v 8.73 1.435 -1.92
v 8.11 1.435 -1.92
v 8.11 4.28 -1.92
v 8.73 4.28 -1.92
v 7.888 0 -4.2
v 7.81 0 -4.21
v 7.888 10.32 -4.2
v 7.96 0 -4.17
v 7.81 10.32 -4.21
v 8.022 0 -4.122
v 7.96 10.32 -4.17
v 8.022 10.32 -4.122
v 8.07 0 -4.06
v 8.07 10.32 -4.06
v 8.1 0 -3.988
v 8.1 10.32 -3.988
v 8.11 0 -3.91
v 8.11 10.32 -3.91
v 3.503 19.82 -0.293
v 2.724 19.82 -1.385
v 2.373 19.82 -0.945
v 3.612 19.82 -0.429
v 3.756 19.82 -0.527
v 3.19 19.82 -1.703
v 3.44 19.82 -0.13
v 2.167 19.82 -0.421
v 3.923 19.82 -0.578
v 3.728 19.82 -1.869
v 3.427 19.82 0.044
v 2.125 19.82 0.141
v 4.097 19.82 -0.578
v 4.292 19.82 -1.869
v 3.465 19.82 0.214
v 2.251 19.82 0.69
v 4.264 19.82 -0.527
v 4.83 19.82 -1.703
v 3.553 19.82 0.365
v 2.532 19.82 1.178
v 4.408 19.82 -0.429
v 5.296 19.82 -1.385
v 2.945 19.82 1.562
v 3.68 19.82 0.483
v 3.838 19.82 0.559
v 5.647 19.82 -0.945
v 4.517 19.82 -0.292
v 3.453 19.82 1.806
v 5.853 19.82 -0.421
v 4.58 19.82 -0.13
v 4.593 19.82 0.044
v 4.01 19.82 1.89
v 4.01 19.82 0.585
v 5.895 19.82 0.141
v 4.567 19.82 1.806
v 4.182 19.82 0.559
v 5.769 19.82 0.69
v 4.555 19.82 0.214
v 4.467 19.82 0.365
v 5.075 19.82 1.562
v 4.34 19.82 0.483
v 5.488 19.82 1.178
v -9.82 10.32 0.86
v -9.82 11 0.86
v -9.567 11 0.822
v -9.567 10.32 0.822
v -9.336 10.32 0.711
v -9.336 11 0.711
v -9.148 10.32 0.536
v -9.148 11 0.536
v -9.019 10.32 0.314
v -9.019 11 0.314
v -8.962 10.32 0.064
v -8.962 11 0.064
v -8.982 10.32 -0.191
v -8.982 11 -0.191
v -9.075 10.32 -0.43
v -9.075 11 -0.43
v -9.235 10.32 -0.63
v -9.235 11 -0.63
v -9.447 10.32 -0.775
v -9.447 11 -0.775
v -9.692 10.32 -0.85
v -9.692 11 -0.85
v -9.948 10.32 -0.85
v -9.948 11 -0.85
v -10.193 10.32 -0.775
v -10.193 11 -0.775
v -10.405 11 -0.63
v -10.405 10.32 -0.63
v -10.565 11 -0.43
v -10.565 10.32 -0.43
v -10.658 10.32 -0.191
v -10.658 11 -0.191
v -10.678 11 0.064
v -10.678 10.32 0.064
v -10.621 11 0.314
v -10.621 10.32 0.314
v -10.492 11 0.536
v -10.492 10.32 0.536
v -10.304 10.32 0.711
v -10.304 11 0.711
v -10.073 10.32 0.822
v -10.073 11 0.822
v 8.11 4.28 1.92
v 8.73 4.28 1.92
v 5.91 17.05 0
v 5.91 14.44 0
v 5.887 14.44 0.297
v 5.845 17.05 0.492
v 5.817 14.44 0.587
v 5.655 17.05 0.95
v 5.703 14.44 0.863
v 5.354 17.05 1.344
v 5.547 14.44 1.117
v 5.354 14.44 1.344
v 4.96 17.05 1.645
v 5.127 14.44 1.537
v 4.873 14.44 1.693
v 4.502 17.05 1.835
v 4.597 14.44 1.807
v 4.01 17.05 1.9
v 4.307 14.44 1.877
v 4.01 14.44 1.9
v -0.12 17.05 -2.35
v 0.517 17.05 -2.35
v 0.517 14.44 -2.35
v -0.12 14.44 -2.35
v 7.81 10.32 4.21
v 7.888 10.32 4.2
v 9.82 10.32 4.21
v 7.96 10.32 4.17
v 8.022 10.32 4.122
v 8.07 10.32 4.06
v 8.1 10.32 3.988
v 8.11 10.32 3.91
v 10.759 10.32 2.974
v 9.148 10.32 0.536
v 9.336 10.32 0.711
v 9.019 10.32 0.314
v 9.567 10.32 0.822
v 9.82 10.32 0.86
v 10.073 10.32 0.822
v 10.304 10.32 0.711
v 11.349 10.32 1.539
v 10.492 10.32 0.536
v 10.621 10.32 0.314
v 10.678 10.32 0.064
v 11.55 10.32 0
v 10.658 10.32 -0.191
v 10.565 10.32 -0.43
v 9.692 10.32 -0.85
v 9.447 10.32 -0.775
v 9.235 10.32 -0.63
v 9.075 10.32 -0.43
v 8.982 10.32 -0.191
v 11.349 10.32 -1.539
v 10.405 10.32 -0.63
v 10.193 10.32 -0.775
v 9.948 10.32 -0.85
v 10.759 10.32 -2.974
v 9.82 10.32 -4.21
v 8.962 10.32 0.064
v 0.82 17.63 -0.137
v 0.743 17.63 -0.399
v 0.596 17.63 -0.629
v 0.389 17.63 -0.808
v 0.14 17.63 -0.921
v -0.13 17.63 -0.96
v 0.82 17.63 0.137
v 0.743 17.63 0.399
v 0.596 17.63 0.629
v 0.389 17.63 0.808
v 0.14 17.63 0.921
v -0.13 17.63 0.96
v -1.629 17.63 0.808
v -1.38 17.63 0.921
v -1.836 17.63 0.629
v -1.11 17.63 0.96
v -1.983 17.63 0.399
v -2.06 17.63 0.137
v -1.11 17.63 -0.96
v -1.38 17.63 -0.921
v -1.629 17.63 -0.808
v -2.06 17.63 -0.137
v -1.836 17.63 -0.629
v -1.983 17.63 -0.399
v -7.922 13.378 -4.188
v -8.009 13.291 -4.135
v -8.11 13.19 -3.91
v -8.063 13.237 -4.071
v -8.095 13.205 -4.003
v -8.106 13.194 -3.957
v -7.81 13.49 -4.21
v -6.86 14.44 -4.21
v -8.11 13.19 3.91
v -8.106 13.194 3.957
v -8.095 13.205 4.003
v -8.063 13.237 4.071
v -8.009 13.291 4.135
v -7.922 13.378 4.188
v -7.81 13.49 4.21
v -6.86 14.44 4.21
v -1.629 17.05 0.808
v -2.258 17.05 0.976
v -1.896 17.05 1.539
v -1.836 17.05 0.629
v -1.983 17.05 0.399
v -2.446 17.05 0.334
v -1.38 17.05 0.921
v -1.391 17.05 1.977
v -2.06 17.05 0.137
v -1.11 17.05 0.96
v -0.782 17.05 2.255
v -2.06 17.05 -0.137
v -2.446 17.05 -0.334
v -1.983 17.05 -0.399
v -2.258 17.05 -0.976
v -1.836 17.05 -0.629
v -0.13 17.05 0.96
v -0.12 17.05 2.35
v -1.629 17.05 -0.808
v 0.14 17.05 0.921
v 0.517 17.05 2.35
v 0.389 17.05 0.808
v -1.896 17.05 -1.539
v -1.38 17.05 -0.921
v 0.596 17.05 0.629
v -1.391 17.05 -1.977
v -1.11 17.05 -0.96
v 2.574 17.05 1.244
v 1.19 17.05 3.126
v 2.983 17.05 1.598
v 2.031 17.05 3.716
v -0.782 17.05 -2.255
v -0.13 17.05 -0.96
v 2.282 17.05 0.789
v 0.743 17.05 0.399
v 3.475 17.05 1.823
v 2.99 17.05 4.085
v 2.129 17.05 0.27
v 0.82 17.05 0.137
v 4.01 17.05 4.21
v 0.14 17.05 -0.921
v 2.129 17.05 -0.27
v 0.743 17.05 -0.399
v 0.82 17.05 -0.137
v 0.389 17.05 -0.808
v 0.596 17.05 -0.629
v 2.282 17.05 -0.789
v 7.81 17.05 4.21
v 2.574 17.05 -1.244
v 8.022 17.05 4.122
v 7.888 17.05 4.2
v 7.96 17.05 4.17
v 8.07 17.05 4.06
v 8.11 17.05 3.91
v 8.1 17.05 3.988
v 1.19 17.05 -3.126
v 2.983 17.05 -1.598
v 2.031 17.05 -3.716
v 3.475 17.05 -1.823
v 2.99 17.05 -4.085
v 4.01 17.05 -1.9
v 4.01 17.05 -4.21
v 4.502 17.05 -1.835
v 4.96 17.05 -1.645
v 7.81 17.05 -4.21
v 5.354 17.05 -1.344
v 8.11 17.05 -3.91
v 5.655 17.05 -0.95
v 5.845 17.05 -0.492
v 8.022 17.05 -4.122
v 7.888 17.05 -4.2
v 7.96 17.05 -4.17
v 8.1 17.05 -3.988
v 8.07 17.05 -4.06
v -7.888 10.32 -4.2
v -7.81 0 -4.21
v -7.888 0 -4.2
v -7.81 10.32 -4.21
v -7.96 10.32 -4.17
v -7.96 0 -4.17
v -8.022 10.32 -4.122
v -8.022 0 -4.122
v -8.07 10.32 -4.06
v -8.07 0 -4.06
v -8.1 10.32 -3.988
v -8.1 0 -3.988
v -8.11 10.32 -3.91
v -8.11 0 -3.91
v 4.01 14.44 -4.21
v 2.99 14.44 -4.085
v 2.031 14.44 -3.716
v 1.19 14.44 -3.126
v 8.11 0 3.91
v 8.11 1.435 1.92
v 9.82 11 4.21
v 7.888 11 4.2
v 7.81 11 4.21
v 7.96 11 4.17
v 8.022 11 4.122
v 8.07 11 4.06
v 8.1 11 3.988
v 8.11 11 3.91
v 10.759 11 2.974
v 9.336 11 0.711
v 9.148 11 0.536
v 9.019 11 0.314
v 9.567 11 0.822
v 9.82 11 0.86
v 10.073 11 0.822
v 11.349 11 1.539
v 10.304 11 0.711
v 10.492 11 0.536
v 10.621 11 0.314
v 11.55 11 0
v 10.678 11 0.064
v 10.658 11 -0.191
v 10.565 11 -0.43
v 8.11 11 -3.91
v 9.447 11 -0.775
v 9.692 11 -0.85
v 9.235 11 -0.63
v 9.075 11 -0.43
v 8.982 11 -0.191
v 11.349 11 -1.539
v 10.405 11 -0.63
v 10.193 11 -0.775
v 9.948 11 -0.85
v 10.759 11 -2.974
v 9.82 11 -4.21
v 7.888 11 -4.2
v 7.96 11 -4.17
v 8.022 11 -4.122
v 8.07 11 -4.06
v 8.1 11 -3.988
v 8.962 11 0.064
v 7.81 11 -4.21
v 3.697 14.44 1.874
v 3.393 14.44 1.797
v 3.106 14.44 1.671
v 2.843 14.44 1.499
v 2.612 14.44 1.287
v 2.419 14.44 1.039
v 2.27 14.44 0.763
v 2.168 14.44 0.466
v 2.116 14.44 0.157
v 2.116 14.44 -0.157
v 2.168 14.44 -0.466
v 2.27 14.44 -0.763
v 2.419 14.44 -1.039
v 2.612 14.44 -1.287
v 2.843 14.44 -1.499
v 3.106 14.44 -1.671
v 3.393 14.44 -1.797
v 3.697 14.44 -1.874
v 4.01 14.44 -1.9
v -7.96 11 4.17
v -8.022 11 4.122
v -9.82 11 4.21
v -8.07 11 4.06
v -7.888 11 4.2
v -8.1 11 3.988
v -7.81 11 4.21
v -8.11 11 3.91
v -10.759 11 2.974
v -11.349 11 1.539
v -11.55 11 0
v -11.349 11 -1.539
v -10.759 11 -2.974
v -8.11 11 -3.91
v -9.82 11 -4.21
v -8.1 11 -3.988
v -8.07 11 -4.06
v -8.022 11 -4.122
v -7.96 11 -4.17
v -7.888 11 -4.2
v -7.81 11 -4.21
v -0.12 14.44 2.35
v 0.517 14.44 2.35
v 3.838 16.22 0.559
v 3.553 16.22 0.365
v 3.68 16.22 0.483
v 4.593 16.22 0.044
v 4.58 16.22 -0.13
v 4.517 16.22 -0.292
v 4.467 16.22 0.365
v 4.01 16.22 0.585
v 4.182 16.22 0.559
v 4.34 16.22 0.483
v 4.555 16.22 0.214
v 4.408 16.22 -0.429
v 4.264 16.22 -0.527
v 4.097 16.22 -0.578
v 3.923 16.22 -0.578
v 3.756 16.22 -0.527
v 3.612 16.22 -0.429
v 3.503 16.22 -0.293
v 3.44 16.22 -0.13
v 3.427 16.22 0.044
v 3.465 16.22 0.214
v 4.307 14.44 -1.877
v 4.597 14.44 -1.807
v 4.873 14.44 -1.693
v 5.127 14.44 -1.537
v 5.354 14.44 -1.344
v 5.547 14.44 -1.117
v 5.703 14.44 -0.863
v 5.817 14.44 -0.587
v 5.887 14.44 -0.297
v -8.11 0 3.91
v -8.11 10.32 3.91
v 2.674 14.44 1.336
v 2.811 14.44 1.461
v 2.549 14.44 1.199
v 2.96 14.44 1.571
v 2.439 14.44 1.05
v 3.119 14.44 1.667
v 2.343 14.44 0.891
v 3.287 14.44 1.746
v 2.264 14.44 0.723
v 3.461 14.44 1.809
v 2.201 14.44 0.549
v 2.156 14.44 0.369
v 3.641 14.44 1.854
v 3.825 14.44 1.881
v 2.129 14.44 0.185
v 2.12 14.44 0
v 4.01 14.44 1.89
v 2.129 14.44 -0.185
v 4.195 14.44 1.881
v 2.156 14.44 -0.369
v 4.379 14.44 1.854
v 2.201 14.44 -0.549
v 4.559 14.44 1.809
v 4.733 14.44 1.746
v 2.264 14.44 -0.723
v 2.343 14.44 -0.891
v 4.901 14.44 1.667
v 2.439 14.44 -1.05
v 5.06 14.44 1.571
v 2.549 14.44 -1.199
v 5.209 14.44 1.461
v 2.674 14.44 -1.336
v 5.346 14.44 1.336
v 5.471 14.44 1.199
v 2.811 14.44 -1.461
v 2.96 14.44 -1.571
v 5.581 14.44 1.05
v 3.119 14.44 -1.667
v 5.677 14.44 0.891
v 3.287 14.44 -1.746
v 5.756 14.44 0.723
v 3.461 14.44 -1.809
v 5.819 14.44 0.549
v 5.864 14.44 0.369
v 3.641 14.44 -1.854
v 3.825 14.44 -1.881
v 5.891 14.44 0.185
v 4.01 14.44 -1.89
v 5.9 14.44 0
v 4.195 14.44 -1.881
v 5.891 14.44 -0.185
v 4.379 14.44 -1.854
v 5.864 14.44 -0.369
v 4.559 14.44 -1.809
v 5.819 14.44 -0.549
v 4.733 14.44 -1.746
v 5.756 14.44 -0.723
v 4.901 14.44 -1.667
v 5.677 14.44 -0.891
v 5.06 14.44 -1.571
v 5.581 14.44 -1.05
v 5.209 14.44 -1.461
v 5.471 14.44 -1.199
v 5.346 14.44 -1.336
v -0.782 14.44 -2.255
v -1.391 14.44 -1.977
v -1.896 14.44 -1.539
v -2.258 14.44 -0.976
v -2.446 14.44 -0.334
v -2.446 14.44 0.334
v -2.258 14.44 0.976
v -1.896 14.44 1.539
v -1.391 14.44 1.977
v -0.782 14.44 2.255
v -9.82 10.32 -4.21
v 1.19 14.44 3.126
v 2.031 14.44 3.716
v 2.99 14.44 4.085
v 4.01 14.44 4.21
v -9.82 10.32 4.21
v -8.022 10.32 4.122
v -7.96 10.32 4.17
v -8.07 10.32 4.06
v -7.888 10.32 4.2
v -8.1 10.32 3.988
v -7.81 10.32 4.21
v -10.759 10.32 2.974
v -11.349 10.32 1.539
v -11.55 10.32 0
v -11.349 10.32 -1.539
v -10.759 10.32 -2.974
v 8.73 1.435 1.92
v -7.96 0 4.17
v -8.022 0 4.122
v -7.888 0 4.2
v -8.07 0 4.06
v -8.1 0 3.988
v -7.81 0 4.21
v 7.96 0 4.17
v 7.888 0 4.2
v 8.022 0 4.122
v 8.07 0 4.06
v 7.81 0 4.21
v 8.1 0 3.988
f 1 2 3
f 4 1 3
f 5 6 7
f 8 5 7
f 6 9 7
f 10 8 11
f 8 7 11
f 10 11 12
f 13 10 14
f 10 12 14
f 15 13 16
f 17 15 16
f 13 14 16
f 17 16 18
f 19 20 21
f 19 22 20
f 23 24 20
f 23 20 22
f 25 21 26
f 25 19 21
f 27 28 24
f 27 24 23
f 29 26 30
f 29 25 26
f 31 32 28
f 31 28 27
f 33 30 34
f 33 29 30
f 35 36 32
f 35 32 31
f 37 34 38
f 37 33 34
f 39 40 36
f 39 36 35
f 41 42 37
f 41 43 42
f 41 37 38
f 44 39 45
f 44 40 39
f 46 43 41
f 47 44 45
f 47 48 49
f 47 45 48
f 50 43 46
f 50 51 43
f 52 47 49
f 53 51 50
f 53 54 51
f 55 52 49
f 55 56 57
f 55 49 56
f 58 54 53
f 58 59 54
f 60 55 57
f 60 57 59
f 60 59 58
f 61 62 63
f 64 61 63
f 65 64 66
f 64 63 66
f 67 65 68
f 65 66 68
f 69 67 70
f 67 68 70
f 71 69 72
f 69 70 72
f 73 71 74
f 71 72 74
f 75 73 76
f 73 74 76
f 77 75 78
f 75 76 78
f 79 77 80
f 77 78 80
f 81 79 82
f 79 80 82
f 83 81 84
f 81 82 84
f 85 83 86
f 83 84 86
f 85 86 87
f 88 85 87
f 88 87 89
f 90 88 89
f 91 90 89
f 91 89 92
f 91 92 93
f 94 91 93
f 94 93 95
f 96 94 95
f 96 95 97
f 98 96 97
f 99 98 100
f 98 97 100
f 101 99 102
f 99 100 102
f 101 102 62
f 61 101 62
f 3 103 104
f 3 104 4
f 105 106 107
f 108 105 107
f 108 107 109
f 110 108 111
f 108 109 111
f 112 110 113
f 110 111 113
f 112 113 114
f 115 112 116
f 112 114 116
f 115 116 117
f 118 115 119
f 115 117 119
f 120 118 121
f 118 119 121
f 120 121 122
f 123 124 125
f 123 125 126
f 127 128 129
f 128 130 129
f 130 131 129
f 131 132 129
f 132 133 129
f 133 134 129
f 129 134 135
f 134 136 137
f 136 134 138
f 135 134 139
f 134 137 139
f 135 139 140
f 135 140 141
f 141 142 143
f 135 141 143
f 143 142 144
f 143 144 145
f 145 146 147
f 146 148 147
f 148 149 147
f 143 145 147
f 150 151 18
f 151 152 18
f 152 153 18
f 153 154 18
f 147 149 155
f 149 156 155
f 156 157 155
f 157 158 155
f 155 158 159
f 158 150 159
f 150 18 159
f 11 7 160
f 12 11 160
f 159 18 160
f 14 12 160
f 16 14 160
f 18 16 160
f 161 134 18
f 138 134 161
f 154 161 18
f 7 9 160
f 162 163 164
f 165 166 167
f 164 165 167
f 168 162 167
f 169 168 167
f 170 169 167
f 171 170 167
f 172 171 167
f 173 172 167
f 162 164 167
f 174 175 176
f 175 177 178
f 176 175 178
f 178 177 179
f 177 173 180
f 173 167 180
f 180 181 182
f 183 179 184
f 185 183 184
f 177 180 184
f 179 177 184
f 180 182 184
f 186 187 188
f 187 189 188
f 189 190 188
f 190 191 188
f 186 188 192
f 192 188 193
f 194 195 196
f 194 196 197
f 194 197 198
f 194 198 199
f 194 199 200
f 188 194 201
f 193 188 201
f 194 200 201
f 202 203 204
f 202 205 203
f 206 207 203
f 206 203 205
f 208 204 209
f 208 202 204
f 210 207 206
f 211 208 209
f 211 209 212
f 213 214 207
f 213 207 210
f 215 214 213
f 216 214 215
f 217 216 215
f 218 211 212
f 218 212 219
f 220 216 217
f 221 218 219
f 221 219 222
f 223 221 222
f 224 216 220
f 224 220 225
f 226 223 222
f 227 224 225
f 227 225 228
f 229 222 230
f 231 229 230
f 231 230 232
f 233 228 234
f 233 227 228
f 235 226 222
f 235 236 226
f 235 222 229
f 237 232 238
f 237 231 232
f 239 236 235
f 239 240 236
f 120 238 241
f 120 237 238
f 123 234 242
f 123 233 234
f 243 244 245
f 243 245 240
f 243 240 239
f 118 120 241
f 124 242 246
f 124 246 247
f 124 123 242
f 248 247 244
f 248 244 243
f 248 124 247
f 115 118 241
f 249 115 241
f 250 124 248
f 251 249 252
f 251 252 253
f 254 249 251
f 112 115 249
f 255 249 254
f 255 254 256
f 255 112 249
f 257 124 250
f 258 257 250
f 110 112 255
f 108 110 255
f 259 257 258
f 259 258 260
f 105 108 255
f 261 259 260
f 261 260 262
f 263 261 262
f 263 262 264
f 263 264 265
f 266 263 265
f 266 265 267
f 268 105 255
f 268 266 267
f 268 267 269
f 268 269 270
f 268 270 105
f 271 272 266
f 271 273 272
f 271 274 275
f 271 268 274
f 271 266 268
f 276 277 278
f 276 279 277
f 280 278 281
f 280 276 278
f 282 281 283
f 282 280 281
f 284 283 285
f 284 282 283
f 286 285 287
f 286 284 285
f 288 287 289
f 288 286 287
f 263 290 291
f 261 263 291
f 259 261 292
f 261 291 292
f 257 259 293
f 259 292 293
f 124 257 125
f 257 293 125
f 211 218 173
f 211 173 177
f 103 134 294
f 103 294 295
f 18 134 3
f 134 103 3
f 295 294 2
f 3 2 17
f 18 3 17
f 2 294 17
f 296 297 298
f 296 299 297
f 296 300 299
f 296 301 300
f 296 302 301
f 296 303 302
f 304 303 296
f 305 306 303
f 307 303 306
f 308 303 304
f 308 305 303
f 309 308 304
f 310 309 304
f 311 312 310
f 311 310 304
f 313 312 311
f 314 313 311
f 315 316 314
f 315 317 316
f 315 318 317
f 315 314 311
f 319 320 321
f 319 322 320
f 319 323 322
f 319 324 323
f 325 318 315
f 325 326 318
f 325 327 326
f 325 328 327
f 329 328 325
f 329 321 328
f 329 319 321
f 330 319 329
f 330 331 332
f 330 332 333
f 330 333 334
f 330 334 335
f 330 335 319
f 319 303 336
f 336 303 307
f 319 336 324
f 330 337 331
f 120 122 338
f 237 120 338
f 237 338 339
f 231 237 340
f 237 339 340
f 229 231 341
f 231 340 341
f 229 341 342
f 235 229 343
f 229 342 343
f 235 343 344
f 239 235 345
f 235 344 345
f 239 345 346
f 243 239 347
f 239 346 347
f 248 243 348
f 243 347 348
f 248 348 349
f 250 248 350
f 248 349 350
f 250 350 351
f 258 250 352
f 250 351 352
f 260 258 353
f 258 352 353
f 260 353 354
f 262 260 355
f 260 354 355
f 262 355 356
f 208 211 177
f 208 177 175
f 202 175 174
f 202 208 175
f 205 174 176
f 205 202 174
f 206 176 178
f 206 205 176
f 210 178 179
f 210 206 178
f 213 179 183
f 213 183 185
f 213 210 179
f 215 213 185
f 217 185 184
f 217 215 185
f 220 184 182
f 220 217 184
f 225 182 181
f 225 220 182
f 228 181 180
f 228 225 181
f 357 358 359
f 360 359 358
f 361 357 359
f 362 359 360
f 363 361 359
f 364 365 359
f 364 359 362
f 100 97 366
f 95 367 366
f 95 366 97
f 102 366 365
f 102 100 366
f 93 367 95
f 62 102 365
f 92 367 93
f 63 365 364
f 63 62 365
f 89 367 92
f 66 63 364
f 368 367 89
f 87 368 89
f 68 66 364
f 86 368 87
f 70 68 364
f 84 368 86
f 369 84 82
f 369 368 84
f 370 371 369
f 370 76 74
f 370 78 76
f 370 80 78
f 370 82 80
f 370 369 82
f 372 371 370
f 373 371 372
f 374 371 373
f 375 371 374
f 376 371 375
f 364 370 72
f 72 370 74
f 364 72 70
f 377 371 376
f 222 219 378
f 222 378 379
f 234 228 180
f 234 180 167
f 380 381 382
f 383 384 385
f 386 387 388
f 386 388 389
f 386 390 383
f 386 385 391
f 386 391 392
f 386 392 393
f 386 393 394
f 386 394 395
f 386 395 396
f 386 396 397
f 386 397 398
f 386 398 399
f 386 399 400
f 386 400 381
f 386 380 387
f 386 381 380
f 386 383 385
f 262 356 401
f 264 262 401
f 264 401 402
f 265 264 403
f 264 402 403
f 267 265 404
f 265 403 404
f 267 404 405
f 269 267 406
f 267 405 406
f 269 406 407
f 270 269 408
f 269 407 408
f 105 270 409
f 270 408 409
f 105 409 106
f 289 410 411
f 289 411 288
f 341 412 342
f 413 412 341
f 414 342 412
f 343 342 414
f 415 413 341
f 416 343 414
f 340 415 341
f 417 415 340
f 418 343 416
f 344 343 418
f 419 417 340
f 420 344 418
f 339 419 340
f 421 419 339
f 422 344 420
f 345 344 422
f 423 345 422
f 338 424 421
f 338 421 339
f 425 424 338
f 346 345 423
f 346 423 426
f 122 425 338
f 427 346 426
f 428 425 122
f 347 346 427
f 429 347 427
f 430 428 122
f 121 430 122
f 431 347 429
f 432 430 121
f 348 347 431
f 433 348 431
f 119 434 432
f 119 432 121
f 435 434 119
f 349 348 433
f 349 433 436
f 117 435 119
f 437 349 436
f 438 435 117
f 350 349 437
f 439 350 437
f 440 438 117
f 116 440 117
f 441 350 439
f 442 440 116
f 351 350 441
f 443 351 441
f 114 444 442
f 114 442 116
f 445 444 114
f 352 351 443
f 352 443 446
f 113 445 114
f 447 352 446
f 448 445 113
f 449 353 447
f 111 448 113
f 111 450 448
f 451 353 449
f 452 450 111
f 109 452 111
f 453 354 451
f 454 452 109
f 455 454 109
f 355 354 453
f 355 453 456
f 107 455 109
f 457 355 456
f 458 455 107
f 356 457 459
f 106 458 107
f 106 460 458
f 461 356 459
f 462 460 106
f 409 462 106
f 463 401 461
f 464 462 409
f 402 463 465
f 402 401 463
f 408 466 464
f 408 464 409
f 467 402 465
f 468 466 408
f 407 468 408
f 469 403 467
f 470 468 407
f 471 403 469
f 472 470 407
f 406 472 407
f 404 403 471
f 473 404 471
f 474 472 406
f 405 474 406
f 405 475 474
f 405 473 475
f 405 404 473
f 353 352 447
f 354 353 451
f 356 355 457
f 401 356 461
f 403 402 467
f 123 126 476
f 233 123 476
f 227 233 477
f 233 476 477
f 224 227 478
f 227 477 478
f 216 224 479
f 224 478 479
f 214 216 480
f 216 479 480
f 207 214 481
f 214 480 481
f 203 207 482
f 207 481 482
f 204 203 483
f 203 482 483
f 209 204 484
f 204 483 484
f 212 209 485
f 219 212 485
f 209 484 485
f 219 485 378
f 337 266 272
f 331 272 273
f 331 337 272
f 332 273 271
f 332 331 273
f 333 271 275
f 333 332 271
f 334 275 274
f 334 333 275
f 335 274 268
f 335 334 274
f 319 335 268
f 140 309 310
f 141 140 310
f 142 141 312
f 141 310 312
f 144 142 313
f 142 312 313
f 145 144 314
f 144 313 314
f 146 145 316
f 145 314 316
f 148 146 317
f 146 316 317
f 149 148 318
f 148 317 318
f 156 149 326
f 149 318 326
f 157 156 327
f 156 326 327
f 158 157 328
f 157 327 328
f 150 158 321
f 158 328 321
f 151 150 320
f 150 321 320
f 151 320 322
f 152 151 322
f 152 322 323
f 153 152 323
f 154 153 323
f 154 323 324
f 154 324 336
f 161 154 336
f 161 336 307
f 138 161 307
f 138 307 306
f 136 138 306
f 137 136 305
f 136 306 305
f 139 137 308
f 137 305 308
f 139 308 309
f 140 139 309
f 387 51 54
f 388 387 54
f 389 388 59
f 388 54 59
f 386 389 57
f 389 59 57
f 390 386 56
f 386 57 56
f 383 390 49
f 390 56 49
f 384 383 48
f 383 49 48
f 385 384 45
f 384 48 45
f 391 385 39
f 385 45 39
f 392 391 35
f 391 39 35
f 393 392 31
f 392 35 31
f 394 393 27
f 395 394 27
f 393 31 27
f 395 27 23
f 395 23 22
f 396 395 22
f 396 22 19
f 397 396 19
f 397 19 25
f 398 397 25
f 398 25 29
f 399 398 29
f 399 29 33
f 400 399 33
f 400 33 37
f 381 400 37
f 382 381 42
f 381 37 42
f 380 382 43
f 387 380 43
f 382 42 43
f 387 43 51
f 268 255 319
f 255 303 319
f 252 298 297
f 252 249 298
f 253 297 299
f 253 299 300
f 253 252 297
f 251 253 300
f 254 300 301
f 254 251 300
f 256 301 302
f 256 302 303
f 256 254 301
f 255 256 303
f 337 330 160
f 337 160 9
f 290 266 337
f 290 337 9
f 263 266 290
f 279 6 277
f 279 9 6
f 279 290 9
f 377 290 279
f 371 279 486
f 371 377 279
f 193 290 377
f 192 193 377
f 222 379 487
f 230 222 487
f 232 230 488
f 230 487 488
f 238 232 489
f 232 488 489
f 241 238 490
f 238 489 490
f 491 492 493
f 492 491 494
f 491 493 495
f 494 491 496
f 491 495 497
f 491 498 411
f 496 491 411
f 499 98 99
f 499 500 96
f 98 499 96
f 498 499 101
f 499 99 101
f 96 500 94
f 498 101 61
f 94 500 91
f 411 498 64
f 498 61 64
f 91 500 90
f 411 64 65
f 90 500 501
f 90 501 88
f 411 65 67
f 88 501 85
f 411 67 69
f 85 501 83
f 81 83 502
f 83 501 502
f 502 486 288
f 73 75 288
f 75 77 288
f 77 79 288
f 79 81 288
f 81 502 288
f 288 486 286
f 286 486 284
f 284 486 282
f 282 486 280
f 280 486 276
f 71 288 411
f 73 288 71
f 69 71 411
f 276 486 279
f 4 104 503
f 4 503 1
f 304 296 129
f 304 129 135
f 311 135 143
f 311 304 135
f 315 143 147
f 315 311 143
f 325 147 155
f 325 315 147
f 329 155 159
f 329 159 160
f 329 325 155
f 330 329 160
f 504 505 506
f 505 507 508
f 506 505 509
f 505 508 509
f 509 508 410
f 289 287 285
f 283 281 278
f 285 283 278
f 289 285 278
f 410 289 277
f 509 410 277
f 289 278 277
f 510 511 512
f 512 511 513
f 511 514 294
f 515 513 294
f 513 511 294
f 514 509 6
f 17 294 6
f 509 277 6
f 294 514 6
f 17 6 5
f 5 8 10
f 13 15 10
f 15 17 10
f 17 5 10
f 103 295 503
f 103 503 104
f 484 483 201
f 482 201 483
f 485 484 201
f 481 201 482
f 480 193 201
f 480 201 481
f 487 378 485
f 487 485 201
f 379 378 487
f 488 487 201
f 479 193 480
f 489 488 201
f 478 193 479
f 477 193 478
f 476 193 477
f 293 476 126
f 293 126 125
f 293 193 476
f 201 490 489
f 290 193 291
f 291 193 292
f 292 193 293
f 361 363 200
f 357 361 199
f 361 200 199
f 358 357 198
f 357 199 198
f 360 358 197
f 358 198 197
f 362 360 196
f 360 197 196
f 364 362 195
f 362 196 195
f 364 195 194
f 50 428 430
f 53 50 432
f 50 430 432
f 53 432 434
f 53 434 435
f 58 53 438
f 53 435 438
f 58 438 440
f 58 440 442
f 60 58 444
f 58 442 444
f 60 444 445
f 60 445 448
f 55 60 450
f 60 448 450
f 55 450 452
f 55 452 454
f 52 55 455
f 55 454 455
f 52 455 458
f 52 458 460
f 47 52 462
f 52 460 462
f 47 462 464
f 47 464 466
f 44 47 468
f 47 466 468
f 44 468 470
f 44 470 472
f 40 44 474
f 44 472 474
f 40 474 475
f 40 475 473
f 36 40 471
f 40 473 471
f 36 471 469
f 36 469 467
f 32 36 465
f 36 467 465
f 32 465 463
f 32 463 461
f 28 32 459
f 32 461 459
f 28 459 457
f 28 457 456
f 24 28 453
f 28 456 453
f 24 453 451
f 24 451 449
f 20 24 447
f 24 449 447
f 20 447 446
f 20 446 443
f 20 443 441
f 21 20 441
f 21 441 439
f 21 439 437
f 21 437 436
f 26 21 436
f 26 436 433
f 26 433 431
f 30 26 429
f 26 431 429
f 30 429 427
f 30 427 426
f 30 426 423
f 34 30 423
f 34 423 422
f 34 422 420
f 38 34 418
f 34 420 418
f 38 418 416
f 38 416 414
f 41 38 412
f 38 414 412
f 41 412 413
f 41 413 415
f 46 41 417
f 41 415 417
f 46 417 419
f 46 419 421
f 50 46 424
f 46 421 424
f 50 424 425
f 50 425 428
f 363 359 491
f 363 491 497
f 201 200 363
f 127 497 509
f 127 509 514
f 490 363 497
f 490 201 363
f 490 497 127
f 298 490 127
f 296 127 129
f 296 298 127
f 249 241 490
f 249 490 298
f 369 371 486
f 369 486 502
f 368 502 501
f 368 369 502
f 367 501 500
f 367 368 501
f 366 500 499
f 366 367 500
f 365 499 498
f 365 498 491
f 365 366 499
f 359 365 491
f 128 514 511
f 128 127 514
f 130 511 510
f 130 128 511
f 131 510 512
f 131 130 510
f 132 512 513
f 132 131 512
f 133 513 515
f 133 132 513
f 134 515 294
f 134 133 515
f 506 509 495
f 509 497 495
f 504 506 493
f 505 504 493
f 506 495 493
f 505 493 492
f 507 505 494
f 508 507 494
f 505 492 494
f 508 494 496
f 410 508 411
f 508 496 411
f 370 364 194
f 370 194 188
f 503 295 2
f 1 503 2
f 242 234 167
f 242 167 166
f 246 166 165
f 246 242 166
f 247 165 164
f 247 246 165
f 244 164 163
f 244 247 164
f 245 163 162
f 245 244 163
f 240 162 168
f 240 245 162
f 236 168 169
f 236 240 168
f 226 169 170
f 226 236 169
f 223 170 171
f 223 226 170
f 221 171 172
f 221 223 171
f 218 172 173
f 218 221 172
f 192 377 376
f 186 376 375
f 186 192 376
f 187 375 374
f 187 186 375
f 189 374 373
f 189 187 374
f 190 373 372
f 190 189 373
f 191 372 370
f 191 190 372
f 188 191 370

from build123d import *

# Parameters (mm, degrees)
SKETCH_1_W          = 16.22
SKETCH_1_H          = 8.42
EXTRUDE_1_DEPTH     = 11
SKETCH_2_R          = 0.86
EXTRUDE_2_DEPTH     = 0.68
SKETCH_3_W          = 16.22
SKETCH_3_H          = 8.42
EXTRUDE_3_DEPTH     = 3.44
SKETCH_4_R          = 1.9
EXTRUDE_4_DEPTH     = 2.61
EXTRUDE_5_DEPTH     = 0.58
SKETCH_6_R          = 1.89
EXTRUDE_6_DEPTH     = 5.38
SKETCH_7_R          = 0.585
CUT_EXTRUDE_1_DEPTH = 3.6
CHAMFER_1_SIZE      = 1.25
FILLET_1_R          = 0.3
SKETCH_8_W          = 3.84
SKETCH_8_H          = 2.845310476
EXTRUDE_7_DEPTH     = 0.62


with BuildPart() as part:
    # 草图1 → 凸台-拉伸1 (new body)
    with BuildSketch(Plane(origin=(0, 0, 0), x_dir=(1, 0, 0), z_dir=(0, 1, 0))):
        Rectangle(SKETCH_1_W, SKETCH_1_H)
    extrude(amount=EXTRUDE_1_DEPTH)

    # 草图2 → 凸台-拉伸2 (add)
    # profile 1 of 2: a face of its own
    with BuildSketch(Plane(origin=(0, 11, 0), x_dir=(1, 0, 0), z_dir=(0, 1, 0))):
        with BuildLine():
            Line((-8.11, -4.21), (-8.11, 4.21))
            Line((-8.11, 4.21), (-9.82, 4.21))
            ThreePointArc((-9.82, 4.21), (-11.55, 0), (-9.82, -4.21))
            Line((-9.82, -4.21), (-8.11, -4.21))
        make_face()
        with Locations((-9.82, 0)):
            Circle(SKETCH_2_R, mode=Mode.SUBTRACT)
    # profile 2 of 2: a face of its own
    with BuildSketch(Plane(origin=(0, 11, 0), x_dir=(1, 0, 0), z_dir=(0, 1, 0))):
        with BuildLine():
            Line((9.82, 4.21), (8.11, 4.21))
            Line((8.11, 4.21), (8.11, -4.21))
            Line((8.11, -4.21), (9.82, -4.21))
            ThreePointArc((9.82, -4.21), (11.55, 0), (9.82, 4.21))
        make_face()
        with Locations((9.82, 0)):
            Circle(SKETCH_2_R, mode=Mode.SUBTRACT)
    extrude(amount=-EXTRUDE_2_DEPTH)

    # 草图3 → 凸台-拉伸3 (add)
    with BuildSketch(Plane(origin=(0, 11, 0), x_dir=(1, 0, 0), z_dir=(0, 1, 0))):
        Rectangle(SKETCH_3_W, SKETCH_3_H)
    extrude(amount=EXTRUDE_3_DEPTH)

    # 草图4 → 凸台-拉伸4 (add)
    with BuildSketch(Plane(origin=(0, 14.44, 0), x_dir=(1, 0, 0), z_dir=(0, 1, 0))):
        with BuildLine():
            Line((8.11, -4.21), (8.11, 4.21))
            Line((8.11, 4.21), (4.01, 4.21))
            ThreePointArc((4.01, 4.21), (2.031288298, 3.716019376), (0.516921129, 2.35))
            Line((0.516921129, 2.35), (-0.12, 2.35))
            ThreePointArc((-0.12, 2.35), (-2.47, 0), (-0.12, -2.35))
            Line((-0.12, -2.35), (0.516921129, -2.35))
            ThreePointArc((0.516921129, -2.35), (2.031288298, -3.716019376), (4.01, -4.21))
            Line((4.01, -4.21), (8.11, -4.21))
        make_face()
        with Locations((4.01, 0)):
            Circle(SKETCH_4_R, mode=Mode.SUBTRACT)
    extrude(amount=EXTRUDE_4_DEPTH)

    # 草图5 → 凸台-拉伸5 (add)
    with BuildSketch(Plane(origin=(0, 17.05, 0), x_dir=(1, 0, 0), z_dir=(0, 1, 0))):
        with BuildLine():
            Line((-1.11, 0.96), (-0.13, 0.96))
            ThreePointArc((-0.13, 0.96), (0.83, 0), (-0.13, -0.96))
            Line((-0.13, -0.96), (-1.11, -0.96))
            ThreePointArc((-1.11, -0.96), (-2.07, 0), (-1.11, 0.96))
        make_face()
    extrude(amount=EXTRUDE_5_DEPTH)

    # 草图6 → 凸台-拉伸6 (add)
    with BuildSketch(Plane(origin=(0, 14.44, 0), x_dir=(1, 0, 0), z_dir=(0, 1, 0))):
        with Locations((4.01, 0)):
            Circle(SKETCH_6_R)
    extrude(amount=EXTRUDE_6_DEPTH)

    # 草图7 → 切除-拉伸1 (cut)
    with BuildSketch(Plane(origin=(0, 19.82, 0), x_dir=(1, 0, 0), z_dir=(0, 1, 0))):
        with Locations((4.01, 0)):
            Circle(SKETCH_7_R)
    extrude(amount=-CUT_EXTRUDE_1_DEPTH, mode=Mode.SUBTRACT)

    # Chamfer 1
    chamfer_1_edges = [part.edges().sort_by_distance(p)[0] for p in [
        (-8.11, 14.44, 0),
    ]]
    chamfer(chamfer_1_edges, length=CHAMFER_1_SIZE)

    # Fillet 1
    fillet_1_edges = [part.edges().sort_by_distance(p)[0] for p in [
        (8.11, 5.16, -4.21),
        (8.11, 14.025, -4.21),
        (8.11, 14.025, 4.21),
        (8.11, 5.16, 4.21),
        (-8.11, 12.095, 4.21),
        (-8.11, 12.095, -4.21),
        (-8.11, 5.16, -4.21),
        (-8.11, 5.16, 4.21),
    ]]
    fillet(fillet_1_edges, radius=FILLET_1_R)

    # 草图8 → 凸台-拉伸7 (add)
    with BuildSketch(Plane(origin=(8.11, 0, 0), x_dir=(0, 0, -1), z_dir=(1, 0, 0))):
        with Locations((0, 2.857344762)):
            Rectangle(SKETCH_8_W, SKETCH_8_H)
    extrude(amount=EXTRUDE_7_DEPTH)


solid = part.part
